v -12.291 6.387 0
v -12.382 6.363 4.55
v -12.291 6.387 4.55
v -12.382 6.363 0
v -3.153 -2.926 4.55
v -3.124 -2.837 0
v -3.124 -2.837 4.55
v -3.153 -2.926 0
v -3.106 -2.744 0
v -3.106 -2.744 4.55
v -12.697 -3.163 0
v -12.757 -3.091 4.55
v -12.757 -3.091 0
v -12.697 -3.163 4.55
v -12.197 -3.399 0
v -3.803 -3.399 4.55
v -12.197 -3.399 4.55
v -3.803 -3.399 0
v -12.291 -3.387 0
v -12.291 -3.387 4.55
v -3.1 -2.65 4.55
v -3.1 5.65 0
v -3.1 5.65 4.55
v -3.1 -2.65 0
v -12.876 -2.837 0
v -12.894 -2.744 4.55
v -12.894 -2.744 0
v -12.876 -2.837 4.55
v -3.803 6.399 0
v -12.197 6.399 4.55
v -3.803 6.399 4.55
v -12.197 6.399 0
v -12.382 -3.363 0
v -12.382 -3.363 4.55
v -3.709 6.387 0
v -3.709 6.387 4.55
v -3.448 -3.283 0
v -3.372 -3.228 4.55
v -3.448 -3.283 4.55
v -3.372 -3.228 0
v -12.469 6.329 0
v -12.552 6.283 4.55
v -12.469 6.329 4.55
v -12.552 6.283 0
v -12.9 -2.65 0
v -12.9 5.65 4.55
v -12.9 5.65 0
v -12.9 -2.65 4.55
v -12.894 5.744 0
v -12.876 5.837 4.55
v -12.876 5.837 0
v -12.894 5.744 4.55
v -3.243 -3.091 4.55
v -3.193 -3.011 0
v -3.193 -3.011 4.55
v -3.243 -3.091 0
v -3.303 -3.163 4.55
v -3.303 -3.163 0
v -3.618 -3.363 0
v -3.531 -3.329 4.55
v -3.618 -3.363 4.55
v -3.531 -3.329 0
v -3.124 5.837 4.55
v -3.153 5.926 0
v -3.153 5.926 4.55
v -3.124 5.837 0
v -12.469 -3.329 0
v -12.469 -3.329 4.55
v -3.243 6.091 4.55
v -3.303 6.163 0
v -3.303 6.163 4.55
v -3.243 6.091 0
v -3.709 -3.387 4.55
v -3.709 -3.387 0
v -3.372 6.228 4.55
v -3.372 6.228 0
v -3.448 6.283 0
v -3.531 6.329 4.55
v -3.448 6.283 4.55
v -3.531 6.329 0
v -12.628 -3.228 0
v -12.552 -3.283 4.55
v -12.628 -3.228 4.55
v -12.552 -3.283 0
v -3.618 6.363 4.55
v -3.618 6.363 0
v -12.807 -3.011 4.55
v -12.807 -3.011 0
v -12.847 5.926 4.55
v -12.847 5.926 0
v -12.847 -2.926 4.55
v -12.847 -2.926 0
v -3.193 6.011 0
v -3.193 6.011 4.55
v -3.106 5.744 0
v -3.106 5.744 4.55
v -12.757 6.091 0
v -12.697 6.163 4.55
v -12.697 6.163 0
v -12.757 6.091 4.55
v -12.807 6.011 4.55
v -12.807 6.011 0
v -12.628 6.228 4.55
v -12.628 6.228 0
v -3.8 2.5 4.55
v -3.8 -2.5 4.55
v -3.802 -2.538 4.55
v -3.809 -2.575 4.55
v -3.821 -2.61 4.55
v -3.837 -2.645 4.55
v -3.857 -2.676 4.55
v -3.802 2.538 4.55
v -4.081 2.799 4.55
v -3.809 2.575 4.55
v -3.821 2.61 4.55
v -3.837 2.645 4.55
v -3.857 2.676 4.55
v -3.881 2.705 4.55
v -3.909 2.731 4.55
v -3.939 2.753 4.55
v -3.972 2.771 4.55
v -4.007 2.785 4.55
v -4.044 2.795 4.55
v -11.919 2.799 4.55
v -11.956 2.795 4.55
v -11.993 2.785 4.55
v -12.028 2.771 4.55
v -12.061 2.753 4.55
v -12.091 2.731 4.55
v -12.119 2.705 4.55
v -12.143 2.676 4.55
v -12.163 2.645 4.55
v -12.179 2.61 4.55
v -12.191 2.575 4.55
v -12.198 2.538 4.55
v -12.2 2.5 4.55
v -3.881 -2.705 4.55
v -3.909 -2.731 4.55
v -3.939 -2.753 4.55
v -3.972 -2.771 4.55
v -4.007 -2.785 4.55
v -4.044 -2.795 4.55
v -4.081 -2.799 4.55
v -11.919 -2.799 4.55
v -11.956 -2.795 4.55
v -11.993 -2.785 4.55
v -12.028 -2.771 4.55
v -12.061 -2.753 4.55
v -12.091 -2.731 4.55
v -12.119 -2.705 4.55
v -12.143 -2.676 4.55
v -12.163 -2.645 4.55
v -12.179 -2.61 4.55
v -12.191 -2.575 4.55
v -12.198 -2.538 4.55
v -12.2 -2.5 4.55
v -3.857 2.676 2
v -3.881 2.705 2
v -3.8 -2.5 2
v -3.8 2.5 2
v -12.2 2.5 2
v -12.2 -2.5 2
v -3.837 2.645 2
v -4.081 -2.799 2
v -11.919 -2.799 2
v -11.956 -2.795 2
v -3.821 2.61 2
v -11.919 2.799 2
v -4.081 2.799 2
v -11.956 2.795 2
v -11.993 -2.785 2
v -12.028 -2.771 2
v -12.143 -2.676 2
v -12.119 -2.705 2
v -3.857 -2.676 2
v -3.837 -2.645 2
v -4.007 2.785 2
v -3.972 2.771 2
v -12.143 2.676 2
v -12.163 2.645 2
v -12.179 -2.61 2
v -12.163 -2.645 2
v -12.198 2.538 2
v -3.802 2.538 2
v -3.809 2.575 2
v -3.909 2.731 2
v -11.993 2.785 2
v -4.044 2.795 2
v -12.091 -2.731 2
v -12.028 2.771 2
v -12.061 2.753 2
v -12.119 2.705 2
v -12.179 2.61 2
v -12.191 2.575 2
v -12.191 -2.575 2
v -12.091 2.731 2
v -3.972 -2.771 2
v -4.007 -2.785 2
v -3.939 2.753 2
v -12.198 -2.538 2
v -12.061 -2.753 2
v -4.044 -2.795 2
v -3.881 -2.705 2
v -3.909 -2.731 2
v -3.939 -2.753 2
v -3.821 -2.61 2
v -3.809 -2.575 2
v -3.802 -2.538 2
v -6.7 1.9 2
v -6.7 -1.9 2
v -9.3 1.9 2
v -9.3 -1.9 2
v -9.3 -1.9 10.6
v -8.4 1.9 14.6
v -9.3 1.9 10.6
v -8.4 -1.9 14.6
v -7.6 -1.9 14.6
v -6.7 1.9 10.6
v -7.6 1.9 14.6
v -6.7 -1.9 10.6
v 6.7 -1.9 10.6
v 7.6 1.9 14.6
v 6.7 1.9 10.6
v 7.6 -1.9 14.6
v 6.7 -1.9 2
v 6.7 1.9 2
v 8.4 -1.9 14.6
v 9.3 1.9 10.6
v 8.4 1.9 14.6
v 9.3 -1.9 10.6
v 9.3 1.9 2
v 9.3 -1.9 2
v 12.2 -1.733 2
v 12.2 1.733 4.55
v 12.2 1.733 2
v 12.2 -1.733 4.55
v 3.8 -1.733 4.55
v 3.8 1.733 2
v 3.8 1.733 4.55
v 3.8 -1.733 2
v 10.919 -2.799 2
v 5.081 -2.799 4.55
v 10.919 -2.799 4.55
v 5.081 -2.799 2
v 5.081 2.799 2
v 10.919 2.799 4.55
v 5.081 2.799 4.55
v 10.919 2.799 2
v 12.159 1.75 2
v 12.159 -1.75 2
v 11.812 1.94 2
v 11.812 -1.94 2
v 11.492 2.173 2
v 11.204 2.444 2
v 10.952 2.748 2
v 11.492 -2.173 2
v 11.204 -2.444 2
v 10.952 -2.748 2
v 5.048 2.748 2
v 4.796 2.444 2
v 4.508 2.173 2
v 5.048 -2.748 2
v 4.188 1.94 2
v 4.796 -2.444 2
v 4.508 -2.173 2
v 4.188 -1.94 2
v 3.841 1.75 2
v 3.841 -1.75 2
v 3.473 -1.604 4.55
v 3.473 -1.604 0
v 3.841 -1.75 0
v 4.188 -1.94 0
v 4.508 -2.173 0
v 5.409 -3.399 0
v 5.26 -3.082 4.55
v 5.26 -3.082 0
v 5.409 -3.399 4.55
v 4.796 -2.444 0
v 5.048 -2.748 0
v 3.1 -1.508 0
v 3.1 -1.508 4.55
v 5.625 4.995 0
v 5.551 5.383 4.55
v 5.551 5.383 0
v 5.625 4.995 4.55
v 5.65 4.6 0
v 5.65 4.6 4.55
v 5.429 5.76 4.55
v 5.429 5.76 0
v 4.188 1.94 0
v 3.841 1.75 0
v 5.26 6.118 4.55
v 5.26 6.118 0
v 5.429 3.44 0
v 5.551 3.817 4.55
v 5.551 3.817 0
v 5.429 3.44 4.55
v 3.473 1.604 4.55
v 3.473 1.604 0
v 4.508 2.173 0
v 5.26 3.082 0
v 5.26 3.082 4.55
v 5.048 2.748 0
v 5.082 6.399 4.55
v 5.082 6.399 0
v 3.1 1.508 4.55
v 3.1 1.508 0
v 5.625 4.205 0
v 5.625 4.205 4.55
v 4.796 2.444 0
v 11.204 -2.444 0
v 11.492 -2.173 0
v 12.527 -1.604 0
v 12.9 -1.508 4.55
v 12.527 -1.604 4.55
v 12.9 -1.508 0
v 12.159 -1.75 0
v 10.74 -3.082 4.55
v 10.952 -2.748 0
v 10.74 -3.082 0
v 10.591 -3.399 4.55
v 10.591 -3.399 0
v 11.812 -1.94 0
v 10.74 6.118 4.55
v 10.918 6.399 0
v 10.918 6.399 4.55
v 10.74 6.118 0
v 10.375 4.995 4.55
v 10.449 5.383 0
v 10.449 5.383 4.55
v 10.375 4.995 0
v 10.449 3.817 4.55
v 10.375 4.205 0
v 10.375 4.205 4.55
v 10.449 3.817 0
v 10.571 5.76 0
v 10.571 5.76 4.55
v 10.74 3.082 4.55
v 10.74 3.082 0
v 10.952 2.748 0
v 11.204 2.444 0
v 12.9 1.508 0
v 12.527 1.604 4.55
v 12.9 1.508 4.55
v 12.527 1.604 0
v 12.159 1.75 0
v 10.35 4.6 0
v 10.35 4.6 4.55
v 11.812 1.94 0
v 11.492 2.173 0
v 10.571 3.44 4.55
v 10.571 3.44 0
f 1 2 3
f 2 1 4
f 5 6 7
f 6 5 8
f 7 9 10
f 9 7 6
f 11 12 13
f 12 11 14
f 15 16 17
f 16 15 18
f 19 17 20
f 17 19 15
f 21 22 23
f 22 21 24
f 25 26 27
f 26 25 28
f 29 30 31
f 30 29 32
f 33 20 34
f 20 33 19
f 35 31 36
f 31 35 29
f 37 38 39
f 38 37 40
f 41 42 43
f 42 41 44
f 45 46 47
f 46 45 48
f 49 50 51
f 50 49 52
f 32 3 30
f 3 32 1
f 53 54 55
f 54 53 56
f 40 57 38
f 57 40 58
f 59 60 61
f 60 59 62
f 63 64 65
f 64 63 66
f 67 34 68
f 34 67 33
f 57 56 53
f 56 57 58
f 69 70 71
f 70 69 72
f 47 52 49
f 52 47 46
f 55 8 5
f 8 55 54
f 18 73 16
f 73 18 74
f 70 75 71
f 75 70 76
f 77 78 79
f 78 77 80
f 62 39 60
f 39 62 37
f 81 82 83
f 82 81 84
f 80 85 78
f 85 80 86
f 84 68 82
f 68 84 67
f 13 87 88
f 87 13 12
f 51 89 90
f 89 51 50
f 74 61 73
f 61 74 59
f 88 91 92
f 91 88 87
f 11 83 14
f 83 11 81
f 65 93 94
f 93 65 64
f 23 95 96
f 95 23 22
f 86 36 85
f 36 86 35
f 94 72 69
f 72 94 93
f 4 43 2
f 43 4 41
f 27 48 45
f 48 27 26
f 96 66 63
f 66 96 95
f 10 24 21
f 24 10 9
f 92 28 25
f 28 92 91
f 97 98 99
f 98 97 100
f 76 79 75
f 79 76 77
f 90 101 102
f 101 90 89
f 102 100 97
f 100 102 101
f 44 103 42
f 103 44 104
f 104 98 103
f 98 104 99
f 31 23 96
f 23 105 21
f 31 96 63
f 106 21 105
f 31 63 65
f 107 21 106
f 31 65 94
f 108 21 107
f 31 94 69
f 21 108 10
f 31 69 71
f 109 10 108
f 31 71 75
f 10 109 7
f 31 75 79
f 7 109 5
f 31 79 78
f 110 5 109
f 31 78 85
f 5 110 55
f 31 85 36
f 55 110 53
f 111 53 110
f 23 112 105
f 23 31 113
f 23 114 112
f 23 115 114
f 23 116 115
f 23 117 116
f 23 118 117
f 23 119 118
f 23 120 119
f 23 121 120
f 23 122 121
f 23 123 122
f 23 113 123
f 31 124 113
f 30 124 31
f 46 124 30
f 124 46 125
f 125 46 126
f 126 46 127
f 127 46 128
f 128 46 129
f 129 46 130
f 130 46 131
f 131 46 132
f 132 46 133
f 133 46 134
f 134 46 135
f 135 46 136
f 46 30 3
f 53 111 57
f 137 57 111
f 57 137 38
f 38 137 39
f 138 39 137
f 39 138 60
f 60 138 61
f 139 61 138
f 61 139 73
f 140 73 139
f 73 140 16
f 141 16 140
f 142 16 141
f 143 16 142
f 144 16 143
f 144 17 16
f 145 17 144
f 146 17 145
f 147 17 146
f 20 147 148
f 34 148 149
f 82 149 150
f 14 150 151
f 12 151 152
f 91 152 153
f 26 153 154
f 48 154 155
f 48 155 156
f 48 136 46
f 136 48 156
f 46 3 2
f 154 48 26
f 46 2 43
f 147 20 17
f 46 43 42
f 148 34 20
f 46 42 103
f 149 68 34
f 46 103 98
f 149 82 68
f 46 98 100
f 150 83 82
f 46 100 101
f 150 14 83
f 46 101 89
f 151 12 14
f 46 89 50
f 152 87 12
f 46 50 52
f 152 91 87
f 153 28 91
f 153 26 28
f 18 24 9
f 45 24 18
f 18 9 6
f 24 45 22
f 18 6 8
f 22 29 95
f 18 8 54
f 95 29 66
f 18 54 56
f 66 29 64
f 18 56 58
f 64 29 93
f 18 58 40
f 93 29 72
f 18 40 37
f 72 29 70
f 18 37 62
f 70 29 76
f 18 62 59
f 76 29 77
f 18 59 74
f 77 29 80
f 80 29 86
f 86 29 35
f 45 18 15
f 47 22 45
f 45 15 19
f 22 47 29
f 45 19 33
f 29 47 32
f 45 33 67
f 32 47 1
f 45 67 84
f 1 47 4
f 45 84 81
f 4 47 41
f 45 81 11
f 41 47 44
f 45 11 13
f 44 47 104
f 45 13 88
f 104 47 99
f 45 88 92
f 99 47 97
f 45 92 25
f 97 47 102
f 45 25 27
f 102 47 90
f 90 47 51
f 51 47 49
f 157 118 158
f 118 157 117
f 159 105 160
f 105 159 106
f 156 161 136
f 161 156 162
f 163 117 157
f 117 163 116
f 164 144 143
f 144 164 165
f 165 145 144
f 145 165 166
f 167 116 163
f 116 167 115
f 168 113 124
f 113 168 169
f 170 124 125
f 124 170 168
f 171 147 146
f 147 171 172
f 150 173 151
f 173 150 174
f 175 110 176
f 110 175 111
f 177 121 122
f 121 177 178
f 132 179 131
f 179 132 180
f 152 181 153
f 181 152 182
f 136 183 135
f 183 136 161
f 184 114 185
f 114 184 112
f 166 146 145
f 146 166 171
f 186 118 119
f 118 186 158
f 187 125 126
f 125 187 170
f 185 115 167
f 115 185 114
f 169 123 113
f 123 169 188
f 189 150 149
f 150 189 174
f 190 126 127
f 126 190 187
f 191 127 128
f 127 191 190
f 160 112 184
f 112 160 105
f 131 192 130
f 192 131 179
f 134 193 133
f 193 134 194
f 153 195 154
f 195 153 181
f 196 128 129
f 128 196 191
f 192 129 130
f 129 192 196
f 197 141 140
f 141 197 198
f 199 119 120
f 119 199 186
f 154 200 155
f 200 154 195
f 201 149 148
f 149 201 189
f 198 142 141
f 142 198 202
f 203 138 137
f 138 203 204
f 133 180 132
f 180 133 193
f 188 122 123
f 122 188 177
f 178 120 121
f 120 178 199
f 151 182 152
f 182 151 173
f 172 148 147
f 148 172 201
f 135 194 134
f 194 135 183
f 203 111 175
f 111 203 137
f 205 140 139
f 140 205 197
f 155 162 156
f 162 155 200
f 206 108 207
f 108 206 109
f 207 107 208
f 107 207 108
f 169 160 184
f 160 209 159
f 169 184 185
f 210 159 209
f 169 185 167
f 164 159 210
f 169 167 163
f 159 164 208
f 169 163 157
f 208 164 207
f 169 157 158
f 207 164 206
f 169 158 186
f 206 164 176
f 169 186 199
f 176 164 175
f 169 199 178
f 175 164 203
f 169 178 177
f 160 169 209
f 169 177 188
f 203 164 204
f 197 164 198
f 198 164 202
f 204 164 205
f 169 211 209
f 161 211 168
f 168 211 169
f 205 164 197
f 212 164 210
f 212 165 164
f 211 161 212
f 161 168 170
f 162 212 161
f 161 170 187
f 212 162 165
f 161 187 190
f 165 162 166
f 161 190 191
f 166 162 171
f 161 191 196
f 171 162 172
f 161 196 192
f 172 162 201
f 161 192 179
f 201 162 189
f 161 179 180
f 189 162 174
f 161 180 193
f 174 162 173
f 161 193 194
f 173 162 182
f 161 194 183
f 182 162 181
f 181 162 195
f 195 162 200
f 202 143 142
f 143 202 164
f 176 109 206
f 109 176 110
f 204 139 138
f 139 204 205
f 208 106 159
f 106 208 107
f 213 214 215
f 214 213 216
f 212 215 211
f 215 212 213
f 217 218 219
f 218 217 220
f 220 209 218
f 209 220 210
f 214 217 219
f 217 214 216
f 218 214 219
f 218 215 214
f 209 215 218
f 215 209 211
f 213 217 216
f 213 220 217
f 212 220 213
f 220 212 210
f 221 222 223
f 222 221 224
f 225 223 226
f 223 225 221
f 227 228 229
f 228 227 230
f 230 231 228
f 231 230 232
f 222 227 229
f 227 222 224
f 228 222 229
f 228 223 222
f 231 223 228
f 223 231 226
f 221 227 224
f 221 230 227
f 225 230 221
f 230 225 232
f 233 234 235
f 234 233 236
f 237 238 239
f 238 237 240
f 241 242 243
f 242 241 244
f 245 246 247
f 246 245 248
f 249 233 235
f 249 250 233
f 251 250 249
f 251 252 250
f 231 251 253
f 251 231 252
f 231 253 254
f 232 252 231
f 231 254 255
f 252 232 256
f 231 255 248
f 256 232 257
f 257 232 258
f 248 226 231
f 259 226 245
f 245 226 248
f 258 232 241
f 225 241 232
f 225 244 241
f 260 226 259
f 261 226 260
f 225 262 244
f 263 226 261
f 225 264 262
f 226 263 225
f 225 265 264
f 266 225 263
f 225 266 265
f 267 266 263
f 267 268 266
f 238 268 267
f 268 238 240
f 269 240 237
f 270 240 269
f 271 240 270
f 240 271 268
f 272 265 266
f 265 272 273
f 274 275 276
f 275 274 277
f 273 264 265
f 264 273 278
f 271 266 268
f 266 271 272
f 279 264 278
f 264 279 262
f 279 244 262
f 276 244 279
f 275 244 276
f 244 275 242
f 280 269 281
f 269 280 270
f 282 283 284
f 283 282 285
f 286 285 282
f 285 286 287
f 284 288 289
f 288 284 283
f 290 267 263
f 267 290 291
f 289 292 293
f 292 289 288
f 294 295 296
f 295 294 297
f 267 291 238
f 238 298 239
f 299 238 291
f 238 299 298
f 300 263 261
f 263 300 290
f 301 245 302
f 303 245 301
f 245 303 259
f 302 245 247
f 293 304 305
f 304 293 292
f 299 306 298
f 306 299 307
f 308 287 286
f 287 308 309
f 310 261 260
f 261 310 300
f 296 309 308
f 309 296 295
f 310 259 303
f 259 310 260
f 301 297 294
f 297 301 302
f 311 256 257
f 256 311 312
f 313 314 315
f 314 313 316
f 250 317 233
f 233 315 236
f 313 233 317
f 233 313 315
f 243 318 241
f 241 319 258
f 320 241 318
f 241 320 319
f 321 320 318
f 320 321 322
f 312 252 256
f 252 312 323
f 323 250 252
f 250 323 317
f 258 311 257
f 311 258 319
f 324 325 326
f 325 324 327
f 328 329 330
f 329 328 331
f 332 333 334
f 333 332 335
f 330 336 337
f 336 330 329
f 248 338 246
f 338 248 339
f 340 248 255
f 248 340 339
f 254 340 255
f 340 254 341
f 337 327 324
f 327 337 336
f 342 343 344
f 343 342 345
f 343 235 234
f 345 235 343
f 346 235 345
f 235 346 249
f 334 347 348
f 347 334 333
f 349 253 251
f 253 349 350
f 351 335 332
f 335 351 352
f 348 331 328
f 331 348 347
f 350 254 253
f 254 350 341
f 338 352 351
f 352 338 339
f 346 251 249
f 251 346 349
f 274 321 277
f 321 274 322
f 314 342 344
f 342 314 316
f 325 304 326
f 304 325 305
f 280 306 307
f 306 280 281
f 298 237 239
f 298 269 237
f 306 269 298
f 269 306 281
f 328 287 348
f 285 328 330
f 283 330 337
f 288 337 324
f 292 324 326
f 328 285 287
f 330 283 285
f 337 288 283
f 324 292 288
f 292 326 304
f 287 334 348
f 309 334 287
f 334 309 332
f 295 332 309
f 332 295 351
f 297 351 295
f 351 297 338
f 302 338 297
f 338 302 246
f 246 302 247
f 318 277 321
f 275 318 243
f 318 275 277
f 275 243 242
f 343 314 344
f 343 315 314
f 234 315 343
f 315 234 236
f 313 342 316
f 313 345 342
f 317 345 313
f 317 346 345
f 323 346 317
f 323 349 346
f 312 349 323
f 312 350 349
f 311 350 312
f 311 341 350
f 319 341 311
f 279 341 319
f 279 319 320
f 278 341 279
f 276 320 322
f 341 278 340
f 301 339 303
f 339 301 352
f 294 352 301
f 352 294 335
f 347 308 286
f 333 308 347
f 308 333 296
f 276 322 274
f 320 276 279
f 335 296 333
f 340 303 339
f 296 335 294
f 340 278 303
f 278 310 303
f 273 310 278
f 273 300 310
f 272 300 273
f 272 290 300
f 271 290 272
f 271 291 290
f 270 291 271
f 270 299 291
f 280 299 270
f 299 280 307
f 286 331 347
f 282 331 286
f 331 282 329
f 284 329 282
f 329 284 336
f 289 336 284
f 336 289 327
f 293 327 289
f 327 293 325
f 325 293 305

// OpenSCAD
translate([-8,0,0]) { 
// Archived geometry from ../../../validation_v7_joiner_extrusion/previous_current/parts/oobb_organization_storage_drawer_unit_rectangle_100_ml_tamper_evident_systempak_209_container_2_column_2_row_ai_version_7_style_unit_2_wide_2_tall/front_plug_square.scad
$fn = 50;

difference() {
	union() {
		translate(v = [0, 0, 0]) {
			rotate(a = [0, 0, 0]) {
				difference() {
					union() {
						translate(v = [0, 0, 0]) {
							rotate(a = [0, 0, 0]) {
								difference() {
									union() {
										translate(v = [0, 0, 0]) {
											rotate(a = [0, 0, 0]) {
												difference() {
													union() {
														translate(v = [0, 1.5, 0]) {
															hull() {
																translate(v = [-4.15, 4.15, 0]) {
																	cylinder(h = 4.55, r = 0.75);
																}
																translate(v = [4.15, 4.15, 0]) {
																	cylinder(h = 4.55, r = 0.75);
																}
																translate(v = [-4.15, -4.15, 0]) {
																	cylinder(h = 4.55, r = 0.75);
																}
																translate(v = [4.15, -4.15, 0]) {
																	cylinder(h = 4.55, r = 0.75);
																}
															}
														}
													}
													union() {
														translate(v = [0, 0, 2.0]) {
															hull() {
																translate(v = [-3.9000000000000004, 2.5, 0]) {
																	cylinder(h = 2.65, r = 0.3);
																}
																translate(v = [3.9000000000000004, 2.5, 0]) {
																	cylinder(h = 2.65, r = 0.3);
																}
																translate(v = [-3.9000000000000004, -2.5, 0]) {
																	cylinder(h = 2.65, r = 0.3);
																}
																translate(v = [3.9000000000000004, -2.5, 0]) {
																	cylinder(h = 2.65, r = 0.3);
																}
															}
														}
													}
												}
											}
										}
										translate(v = [0, 0, 0]) {
											rotate(a = [0, 0, 0]) {
												difference() {
													union() {
														translate(v = [-1.4000000000000001, -1.9, 1.95]) {
															cube(size = [2.8000000000000003, 3.8, 12.65]);
														}
													}
													union() {
														translate(v = [0, 2.0, 0]) {
															rotate(a = [90, 0, 0]) {
																linear_extrude(height = 4.0) {
																	polygon(points = [[-1.3, 1.85], [-1.3, 10.6], [-0.4, 14.6], [-0.4, 14.799999999999999], [-1.6, 14.799999999999999], [-1.6, 1.85]]);
																}
															}
														}
														translate(v = [0, 2.0, 0]) {
															rotate(a = [90, 0, 0]) {
																linear_extrude(height = 4.0) {
																	polygon(points = [[1.3, 1.85], [1.3, 10.6], [0.4, 14.6], [0.4, 14.799999999999999], [1.6, 14.799999999999999], [1.6, 1.85]]);
																}
															}
														}
													}
												}
											}
										}
									}
									union();
								}
							}
						}
					}
					union();
				}
			}
		}
	}
	union();
}
 }
translate([8,0,0]) { 
// Archived geometry from ../../../validation_v7_joiner_extrusion/previous_current/parts/oobb_organization_storage_drawer_unit_rectangle_100_ml_tamper_evident_systempak_209_container_2_column_2_row_ai_version_7_style_unit_2_wide_2_tall/front_plug.scad
$fn = 50;

difference() {
	union() {
		translate(v = [0, 0, 0]) {
			rotate(a = [0, 0, 0]) {
				difference() {
					union() {
						translate(v = [0, 0, 0]) {
							rotate(a = [0, 0, 0]) {
								difference() {
									union() {
										translate(v = [0, 0, 0]) {
											rotate(a = [0, 0, 0]) {
												difference() {
													union() {
														translate(v = [0, 1.5, 0]) {
															hull() {
																translate(v = [-4.15, 4.15, 0]) {
																	cylinder(h = 4.55, r = 0.75);
																}
																translate(v = [4.15, 4.15, 0]) {
																	cylinder(h = 4.55, r = 0.75);
																}
																translate(v = [-4.15, -4.15, 0]) {
																	cylinder(h = 4.55, r = 0.75);
																}
																translate(v = [4.15, -4.15, 0]) {
																	cylinder(h = 4.55, r = 0.75);
																}
															}
														}
													}
													union() {
														translate(v = [0, 0, 2.0]) {
															hull() {
																translate(v = [-3.9000000000000004, 2.5, 0]) {
																	cylinder(h = 2.65, r = 0.3);
																}
																translate(v = [3.9000000000000004, 2.5, 0]) {
																	cylinder(h = 2.65, r = 0.3);
																}
																translate(v = [-3.9000000000000004, -2.5, 0]) {
																	cylinder(h = 2.65, r = 0.3);
																}
																translate(v = [3.9000000000000004, -2.5, 0]) {
																	cylinder(h = 2.65, r = 0.3);
																}
															}
														}
														translate(v = [-5.5, -4.6, -0.1]) {
															cylinder(h = 4.75, r = 3.15);
														}
														translate(v = [-5.5, 4.6, -0.1]) {
															cylinder(h = 4.75, r = 3.15);
														}
														translate(v = [5.5, -4.6, -0.1]) {
															cylinder(h = 4.75, r = 3.15);
														}
														translate(v = [5.5, 4.6, -0.1]) {
															cylinder(h = 4.75, r = 3.15);
														}
													}
												}
											}
										}
										translate(v = [0, 0, 0]) {
											rotate(a = [0, 0, 0]) {
												difference() {
													union() {
														translate(v = [-1.4000000000000001, -1.9, 1.95]) {
															cube(size = [2.8000000000000003, 3.8, 12.65]);
														}
													}
													union() {
														translate(v = [0, 2.0, 0]) {
															rotate(a = [90, 0, 0]) {
																linear_extrude(height = 4.0) {
																	polygon(points = [[-1.3, 1.85], [-1.3, 10.6], [-0.4, 14.6], [-0.4, 14.799999999999999], [-1.6, 14.799999999999999], [-1.6, 1.85]]);
																}
															}
														}
														translate(v = [0, 2.0, 0]) {
															rotate(a = [90, 0, 0]) {
																linear_extrude(height = 4.0) {
																	polygon(points = [[1.3, 1.85], [1.3, 10.6], [0.4, 14.6], [0.4, 14.799999999999999], [1.6, 14.799999999999999], [1.6, 1.85]]);
																}
															}
														}
													}
												}
											}
										}
									}
									union();
								}
							}
						}
					}
					union();
				}
			}
		}
	}
	union();
}
 }
